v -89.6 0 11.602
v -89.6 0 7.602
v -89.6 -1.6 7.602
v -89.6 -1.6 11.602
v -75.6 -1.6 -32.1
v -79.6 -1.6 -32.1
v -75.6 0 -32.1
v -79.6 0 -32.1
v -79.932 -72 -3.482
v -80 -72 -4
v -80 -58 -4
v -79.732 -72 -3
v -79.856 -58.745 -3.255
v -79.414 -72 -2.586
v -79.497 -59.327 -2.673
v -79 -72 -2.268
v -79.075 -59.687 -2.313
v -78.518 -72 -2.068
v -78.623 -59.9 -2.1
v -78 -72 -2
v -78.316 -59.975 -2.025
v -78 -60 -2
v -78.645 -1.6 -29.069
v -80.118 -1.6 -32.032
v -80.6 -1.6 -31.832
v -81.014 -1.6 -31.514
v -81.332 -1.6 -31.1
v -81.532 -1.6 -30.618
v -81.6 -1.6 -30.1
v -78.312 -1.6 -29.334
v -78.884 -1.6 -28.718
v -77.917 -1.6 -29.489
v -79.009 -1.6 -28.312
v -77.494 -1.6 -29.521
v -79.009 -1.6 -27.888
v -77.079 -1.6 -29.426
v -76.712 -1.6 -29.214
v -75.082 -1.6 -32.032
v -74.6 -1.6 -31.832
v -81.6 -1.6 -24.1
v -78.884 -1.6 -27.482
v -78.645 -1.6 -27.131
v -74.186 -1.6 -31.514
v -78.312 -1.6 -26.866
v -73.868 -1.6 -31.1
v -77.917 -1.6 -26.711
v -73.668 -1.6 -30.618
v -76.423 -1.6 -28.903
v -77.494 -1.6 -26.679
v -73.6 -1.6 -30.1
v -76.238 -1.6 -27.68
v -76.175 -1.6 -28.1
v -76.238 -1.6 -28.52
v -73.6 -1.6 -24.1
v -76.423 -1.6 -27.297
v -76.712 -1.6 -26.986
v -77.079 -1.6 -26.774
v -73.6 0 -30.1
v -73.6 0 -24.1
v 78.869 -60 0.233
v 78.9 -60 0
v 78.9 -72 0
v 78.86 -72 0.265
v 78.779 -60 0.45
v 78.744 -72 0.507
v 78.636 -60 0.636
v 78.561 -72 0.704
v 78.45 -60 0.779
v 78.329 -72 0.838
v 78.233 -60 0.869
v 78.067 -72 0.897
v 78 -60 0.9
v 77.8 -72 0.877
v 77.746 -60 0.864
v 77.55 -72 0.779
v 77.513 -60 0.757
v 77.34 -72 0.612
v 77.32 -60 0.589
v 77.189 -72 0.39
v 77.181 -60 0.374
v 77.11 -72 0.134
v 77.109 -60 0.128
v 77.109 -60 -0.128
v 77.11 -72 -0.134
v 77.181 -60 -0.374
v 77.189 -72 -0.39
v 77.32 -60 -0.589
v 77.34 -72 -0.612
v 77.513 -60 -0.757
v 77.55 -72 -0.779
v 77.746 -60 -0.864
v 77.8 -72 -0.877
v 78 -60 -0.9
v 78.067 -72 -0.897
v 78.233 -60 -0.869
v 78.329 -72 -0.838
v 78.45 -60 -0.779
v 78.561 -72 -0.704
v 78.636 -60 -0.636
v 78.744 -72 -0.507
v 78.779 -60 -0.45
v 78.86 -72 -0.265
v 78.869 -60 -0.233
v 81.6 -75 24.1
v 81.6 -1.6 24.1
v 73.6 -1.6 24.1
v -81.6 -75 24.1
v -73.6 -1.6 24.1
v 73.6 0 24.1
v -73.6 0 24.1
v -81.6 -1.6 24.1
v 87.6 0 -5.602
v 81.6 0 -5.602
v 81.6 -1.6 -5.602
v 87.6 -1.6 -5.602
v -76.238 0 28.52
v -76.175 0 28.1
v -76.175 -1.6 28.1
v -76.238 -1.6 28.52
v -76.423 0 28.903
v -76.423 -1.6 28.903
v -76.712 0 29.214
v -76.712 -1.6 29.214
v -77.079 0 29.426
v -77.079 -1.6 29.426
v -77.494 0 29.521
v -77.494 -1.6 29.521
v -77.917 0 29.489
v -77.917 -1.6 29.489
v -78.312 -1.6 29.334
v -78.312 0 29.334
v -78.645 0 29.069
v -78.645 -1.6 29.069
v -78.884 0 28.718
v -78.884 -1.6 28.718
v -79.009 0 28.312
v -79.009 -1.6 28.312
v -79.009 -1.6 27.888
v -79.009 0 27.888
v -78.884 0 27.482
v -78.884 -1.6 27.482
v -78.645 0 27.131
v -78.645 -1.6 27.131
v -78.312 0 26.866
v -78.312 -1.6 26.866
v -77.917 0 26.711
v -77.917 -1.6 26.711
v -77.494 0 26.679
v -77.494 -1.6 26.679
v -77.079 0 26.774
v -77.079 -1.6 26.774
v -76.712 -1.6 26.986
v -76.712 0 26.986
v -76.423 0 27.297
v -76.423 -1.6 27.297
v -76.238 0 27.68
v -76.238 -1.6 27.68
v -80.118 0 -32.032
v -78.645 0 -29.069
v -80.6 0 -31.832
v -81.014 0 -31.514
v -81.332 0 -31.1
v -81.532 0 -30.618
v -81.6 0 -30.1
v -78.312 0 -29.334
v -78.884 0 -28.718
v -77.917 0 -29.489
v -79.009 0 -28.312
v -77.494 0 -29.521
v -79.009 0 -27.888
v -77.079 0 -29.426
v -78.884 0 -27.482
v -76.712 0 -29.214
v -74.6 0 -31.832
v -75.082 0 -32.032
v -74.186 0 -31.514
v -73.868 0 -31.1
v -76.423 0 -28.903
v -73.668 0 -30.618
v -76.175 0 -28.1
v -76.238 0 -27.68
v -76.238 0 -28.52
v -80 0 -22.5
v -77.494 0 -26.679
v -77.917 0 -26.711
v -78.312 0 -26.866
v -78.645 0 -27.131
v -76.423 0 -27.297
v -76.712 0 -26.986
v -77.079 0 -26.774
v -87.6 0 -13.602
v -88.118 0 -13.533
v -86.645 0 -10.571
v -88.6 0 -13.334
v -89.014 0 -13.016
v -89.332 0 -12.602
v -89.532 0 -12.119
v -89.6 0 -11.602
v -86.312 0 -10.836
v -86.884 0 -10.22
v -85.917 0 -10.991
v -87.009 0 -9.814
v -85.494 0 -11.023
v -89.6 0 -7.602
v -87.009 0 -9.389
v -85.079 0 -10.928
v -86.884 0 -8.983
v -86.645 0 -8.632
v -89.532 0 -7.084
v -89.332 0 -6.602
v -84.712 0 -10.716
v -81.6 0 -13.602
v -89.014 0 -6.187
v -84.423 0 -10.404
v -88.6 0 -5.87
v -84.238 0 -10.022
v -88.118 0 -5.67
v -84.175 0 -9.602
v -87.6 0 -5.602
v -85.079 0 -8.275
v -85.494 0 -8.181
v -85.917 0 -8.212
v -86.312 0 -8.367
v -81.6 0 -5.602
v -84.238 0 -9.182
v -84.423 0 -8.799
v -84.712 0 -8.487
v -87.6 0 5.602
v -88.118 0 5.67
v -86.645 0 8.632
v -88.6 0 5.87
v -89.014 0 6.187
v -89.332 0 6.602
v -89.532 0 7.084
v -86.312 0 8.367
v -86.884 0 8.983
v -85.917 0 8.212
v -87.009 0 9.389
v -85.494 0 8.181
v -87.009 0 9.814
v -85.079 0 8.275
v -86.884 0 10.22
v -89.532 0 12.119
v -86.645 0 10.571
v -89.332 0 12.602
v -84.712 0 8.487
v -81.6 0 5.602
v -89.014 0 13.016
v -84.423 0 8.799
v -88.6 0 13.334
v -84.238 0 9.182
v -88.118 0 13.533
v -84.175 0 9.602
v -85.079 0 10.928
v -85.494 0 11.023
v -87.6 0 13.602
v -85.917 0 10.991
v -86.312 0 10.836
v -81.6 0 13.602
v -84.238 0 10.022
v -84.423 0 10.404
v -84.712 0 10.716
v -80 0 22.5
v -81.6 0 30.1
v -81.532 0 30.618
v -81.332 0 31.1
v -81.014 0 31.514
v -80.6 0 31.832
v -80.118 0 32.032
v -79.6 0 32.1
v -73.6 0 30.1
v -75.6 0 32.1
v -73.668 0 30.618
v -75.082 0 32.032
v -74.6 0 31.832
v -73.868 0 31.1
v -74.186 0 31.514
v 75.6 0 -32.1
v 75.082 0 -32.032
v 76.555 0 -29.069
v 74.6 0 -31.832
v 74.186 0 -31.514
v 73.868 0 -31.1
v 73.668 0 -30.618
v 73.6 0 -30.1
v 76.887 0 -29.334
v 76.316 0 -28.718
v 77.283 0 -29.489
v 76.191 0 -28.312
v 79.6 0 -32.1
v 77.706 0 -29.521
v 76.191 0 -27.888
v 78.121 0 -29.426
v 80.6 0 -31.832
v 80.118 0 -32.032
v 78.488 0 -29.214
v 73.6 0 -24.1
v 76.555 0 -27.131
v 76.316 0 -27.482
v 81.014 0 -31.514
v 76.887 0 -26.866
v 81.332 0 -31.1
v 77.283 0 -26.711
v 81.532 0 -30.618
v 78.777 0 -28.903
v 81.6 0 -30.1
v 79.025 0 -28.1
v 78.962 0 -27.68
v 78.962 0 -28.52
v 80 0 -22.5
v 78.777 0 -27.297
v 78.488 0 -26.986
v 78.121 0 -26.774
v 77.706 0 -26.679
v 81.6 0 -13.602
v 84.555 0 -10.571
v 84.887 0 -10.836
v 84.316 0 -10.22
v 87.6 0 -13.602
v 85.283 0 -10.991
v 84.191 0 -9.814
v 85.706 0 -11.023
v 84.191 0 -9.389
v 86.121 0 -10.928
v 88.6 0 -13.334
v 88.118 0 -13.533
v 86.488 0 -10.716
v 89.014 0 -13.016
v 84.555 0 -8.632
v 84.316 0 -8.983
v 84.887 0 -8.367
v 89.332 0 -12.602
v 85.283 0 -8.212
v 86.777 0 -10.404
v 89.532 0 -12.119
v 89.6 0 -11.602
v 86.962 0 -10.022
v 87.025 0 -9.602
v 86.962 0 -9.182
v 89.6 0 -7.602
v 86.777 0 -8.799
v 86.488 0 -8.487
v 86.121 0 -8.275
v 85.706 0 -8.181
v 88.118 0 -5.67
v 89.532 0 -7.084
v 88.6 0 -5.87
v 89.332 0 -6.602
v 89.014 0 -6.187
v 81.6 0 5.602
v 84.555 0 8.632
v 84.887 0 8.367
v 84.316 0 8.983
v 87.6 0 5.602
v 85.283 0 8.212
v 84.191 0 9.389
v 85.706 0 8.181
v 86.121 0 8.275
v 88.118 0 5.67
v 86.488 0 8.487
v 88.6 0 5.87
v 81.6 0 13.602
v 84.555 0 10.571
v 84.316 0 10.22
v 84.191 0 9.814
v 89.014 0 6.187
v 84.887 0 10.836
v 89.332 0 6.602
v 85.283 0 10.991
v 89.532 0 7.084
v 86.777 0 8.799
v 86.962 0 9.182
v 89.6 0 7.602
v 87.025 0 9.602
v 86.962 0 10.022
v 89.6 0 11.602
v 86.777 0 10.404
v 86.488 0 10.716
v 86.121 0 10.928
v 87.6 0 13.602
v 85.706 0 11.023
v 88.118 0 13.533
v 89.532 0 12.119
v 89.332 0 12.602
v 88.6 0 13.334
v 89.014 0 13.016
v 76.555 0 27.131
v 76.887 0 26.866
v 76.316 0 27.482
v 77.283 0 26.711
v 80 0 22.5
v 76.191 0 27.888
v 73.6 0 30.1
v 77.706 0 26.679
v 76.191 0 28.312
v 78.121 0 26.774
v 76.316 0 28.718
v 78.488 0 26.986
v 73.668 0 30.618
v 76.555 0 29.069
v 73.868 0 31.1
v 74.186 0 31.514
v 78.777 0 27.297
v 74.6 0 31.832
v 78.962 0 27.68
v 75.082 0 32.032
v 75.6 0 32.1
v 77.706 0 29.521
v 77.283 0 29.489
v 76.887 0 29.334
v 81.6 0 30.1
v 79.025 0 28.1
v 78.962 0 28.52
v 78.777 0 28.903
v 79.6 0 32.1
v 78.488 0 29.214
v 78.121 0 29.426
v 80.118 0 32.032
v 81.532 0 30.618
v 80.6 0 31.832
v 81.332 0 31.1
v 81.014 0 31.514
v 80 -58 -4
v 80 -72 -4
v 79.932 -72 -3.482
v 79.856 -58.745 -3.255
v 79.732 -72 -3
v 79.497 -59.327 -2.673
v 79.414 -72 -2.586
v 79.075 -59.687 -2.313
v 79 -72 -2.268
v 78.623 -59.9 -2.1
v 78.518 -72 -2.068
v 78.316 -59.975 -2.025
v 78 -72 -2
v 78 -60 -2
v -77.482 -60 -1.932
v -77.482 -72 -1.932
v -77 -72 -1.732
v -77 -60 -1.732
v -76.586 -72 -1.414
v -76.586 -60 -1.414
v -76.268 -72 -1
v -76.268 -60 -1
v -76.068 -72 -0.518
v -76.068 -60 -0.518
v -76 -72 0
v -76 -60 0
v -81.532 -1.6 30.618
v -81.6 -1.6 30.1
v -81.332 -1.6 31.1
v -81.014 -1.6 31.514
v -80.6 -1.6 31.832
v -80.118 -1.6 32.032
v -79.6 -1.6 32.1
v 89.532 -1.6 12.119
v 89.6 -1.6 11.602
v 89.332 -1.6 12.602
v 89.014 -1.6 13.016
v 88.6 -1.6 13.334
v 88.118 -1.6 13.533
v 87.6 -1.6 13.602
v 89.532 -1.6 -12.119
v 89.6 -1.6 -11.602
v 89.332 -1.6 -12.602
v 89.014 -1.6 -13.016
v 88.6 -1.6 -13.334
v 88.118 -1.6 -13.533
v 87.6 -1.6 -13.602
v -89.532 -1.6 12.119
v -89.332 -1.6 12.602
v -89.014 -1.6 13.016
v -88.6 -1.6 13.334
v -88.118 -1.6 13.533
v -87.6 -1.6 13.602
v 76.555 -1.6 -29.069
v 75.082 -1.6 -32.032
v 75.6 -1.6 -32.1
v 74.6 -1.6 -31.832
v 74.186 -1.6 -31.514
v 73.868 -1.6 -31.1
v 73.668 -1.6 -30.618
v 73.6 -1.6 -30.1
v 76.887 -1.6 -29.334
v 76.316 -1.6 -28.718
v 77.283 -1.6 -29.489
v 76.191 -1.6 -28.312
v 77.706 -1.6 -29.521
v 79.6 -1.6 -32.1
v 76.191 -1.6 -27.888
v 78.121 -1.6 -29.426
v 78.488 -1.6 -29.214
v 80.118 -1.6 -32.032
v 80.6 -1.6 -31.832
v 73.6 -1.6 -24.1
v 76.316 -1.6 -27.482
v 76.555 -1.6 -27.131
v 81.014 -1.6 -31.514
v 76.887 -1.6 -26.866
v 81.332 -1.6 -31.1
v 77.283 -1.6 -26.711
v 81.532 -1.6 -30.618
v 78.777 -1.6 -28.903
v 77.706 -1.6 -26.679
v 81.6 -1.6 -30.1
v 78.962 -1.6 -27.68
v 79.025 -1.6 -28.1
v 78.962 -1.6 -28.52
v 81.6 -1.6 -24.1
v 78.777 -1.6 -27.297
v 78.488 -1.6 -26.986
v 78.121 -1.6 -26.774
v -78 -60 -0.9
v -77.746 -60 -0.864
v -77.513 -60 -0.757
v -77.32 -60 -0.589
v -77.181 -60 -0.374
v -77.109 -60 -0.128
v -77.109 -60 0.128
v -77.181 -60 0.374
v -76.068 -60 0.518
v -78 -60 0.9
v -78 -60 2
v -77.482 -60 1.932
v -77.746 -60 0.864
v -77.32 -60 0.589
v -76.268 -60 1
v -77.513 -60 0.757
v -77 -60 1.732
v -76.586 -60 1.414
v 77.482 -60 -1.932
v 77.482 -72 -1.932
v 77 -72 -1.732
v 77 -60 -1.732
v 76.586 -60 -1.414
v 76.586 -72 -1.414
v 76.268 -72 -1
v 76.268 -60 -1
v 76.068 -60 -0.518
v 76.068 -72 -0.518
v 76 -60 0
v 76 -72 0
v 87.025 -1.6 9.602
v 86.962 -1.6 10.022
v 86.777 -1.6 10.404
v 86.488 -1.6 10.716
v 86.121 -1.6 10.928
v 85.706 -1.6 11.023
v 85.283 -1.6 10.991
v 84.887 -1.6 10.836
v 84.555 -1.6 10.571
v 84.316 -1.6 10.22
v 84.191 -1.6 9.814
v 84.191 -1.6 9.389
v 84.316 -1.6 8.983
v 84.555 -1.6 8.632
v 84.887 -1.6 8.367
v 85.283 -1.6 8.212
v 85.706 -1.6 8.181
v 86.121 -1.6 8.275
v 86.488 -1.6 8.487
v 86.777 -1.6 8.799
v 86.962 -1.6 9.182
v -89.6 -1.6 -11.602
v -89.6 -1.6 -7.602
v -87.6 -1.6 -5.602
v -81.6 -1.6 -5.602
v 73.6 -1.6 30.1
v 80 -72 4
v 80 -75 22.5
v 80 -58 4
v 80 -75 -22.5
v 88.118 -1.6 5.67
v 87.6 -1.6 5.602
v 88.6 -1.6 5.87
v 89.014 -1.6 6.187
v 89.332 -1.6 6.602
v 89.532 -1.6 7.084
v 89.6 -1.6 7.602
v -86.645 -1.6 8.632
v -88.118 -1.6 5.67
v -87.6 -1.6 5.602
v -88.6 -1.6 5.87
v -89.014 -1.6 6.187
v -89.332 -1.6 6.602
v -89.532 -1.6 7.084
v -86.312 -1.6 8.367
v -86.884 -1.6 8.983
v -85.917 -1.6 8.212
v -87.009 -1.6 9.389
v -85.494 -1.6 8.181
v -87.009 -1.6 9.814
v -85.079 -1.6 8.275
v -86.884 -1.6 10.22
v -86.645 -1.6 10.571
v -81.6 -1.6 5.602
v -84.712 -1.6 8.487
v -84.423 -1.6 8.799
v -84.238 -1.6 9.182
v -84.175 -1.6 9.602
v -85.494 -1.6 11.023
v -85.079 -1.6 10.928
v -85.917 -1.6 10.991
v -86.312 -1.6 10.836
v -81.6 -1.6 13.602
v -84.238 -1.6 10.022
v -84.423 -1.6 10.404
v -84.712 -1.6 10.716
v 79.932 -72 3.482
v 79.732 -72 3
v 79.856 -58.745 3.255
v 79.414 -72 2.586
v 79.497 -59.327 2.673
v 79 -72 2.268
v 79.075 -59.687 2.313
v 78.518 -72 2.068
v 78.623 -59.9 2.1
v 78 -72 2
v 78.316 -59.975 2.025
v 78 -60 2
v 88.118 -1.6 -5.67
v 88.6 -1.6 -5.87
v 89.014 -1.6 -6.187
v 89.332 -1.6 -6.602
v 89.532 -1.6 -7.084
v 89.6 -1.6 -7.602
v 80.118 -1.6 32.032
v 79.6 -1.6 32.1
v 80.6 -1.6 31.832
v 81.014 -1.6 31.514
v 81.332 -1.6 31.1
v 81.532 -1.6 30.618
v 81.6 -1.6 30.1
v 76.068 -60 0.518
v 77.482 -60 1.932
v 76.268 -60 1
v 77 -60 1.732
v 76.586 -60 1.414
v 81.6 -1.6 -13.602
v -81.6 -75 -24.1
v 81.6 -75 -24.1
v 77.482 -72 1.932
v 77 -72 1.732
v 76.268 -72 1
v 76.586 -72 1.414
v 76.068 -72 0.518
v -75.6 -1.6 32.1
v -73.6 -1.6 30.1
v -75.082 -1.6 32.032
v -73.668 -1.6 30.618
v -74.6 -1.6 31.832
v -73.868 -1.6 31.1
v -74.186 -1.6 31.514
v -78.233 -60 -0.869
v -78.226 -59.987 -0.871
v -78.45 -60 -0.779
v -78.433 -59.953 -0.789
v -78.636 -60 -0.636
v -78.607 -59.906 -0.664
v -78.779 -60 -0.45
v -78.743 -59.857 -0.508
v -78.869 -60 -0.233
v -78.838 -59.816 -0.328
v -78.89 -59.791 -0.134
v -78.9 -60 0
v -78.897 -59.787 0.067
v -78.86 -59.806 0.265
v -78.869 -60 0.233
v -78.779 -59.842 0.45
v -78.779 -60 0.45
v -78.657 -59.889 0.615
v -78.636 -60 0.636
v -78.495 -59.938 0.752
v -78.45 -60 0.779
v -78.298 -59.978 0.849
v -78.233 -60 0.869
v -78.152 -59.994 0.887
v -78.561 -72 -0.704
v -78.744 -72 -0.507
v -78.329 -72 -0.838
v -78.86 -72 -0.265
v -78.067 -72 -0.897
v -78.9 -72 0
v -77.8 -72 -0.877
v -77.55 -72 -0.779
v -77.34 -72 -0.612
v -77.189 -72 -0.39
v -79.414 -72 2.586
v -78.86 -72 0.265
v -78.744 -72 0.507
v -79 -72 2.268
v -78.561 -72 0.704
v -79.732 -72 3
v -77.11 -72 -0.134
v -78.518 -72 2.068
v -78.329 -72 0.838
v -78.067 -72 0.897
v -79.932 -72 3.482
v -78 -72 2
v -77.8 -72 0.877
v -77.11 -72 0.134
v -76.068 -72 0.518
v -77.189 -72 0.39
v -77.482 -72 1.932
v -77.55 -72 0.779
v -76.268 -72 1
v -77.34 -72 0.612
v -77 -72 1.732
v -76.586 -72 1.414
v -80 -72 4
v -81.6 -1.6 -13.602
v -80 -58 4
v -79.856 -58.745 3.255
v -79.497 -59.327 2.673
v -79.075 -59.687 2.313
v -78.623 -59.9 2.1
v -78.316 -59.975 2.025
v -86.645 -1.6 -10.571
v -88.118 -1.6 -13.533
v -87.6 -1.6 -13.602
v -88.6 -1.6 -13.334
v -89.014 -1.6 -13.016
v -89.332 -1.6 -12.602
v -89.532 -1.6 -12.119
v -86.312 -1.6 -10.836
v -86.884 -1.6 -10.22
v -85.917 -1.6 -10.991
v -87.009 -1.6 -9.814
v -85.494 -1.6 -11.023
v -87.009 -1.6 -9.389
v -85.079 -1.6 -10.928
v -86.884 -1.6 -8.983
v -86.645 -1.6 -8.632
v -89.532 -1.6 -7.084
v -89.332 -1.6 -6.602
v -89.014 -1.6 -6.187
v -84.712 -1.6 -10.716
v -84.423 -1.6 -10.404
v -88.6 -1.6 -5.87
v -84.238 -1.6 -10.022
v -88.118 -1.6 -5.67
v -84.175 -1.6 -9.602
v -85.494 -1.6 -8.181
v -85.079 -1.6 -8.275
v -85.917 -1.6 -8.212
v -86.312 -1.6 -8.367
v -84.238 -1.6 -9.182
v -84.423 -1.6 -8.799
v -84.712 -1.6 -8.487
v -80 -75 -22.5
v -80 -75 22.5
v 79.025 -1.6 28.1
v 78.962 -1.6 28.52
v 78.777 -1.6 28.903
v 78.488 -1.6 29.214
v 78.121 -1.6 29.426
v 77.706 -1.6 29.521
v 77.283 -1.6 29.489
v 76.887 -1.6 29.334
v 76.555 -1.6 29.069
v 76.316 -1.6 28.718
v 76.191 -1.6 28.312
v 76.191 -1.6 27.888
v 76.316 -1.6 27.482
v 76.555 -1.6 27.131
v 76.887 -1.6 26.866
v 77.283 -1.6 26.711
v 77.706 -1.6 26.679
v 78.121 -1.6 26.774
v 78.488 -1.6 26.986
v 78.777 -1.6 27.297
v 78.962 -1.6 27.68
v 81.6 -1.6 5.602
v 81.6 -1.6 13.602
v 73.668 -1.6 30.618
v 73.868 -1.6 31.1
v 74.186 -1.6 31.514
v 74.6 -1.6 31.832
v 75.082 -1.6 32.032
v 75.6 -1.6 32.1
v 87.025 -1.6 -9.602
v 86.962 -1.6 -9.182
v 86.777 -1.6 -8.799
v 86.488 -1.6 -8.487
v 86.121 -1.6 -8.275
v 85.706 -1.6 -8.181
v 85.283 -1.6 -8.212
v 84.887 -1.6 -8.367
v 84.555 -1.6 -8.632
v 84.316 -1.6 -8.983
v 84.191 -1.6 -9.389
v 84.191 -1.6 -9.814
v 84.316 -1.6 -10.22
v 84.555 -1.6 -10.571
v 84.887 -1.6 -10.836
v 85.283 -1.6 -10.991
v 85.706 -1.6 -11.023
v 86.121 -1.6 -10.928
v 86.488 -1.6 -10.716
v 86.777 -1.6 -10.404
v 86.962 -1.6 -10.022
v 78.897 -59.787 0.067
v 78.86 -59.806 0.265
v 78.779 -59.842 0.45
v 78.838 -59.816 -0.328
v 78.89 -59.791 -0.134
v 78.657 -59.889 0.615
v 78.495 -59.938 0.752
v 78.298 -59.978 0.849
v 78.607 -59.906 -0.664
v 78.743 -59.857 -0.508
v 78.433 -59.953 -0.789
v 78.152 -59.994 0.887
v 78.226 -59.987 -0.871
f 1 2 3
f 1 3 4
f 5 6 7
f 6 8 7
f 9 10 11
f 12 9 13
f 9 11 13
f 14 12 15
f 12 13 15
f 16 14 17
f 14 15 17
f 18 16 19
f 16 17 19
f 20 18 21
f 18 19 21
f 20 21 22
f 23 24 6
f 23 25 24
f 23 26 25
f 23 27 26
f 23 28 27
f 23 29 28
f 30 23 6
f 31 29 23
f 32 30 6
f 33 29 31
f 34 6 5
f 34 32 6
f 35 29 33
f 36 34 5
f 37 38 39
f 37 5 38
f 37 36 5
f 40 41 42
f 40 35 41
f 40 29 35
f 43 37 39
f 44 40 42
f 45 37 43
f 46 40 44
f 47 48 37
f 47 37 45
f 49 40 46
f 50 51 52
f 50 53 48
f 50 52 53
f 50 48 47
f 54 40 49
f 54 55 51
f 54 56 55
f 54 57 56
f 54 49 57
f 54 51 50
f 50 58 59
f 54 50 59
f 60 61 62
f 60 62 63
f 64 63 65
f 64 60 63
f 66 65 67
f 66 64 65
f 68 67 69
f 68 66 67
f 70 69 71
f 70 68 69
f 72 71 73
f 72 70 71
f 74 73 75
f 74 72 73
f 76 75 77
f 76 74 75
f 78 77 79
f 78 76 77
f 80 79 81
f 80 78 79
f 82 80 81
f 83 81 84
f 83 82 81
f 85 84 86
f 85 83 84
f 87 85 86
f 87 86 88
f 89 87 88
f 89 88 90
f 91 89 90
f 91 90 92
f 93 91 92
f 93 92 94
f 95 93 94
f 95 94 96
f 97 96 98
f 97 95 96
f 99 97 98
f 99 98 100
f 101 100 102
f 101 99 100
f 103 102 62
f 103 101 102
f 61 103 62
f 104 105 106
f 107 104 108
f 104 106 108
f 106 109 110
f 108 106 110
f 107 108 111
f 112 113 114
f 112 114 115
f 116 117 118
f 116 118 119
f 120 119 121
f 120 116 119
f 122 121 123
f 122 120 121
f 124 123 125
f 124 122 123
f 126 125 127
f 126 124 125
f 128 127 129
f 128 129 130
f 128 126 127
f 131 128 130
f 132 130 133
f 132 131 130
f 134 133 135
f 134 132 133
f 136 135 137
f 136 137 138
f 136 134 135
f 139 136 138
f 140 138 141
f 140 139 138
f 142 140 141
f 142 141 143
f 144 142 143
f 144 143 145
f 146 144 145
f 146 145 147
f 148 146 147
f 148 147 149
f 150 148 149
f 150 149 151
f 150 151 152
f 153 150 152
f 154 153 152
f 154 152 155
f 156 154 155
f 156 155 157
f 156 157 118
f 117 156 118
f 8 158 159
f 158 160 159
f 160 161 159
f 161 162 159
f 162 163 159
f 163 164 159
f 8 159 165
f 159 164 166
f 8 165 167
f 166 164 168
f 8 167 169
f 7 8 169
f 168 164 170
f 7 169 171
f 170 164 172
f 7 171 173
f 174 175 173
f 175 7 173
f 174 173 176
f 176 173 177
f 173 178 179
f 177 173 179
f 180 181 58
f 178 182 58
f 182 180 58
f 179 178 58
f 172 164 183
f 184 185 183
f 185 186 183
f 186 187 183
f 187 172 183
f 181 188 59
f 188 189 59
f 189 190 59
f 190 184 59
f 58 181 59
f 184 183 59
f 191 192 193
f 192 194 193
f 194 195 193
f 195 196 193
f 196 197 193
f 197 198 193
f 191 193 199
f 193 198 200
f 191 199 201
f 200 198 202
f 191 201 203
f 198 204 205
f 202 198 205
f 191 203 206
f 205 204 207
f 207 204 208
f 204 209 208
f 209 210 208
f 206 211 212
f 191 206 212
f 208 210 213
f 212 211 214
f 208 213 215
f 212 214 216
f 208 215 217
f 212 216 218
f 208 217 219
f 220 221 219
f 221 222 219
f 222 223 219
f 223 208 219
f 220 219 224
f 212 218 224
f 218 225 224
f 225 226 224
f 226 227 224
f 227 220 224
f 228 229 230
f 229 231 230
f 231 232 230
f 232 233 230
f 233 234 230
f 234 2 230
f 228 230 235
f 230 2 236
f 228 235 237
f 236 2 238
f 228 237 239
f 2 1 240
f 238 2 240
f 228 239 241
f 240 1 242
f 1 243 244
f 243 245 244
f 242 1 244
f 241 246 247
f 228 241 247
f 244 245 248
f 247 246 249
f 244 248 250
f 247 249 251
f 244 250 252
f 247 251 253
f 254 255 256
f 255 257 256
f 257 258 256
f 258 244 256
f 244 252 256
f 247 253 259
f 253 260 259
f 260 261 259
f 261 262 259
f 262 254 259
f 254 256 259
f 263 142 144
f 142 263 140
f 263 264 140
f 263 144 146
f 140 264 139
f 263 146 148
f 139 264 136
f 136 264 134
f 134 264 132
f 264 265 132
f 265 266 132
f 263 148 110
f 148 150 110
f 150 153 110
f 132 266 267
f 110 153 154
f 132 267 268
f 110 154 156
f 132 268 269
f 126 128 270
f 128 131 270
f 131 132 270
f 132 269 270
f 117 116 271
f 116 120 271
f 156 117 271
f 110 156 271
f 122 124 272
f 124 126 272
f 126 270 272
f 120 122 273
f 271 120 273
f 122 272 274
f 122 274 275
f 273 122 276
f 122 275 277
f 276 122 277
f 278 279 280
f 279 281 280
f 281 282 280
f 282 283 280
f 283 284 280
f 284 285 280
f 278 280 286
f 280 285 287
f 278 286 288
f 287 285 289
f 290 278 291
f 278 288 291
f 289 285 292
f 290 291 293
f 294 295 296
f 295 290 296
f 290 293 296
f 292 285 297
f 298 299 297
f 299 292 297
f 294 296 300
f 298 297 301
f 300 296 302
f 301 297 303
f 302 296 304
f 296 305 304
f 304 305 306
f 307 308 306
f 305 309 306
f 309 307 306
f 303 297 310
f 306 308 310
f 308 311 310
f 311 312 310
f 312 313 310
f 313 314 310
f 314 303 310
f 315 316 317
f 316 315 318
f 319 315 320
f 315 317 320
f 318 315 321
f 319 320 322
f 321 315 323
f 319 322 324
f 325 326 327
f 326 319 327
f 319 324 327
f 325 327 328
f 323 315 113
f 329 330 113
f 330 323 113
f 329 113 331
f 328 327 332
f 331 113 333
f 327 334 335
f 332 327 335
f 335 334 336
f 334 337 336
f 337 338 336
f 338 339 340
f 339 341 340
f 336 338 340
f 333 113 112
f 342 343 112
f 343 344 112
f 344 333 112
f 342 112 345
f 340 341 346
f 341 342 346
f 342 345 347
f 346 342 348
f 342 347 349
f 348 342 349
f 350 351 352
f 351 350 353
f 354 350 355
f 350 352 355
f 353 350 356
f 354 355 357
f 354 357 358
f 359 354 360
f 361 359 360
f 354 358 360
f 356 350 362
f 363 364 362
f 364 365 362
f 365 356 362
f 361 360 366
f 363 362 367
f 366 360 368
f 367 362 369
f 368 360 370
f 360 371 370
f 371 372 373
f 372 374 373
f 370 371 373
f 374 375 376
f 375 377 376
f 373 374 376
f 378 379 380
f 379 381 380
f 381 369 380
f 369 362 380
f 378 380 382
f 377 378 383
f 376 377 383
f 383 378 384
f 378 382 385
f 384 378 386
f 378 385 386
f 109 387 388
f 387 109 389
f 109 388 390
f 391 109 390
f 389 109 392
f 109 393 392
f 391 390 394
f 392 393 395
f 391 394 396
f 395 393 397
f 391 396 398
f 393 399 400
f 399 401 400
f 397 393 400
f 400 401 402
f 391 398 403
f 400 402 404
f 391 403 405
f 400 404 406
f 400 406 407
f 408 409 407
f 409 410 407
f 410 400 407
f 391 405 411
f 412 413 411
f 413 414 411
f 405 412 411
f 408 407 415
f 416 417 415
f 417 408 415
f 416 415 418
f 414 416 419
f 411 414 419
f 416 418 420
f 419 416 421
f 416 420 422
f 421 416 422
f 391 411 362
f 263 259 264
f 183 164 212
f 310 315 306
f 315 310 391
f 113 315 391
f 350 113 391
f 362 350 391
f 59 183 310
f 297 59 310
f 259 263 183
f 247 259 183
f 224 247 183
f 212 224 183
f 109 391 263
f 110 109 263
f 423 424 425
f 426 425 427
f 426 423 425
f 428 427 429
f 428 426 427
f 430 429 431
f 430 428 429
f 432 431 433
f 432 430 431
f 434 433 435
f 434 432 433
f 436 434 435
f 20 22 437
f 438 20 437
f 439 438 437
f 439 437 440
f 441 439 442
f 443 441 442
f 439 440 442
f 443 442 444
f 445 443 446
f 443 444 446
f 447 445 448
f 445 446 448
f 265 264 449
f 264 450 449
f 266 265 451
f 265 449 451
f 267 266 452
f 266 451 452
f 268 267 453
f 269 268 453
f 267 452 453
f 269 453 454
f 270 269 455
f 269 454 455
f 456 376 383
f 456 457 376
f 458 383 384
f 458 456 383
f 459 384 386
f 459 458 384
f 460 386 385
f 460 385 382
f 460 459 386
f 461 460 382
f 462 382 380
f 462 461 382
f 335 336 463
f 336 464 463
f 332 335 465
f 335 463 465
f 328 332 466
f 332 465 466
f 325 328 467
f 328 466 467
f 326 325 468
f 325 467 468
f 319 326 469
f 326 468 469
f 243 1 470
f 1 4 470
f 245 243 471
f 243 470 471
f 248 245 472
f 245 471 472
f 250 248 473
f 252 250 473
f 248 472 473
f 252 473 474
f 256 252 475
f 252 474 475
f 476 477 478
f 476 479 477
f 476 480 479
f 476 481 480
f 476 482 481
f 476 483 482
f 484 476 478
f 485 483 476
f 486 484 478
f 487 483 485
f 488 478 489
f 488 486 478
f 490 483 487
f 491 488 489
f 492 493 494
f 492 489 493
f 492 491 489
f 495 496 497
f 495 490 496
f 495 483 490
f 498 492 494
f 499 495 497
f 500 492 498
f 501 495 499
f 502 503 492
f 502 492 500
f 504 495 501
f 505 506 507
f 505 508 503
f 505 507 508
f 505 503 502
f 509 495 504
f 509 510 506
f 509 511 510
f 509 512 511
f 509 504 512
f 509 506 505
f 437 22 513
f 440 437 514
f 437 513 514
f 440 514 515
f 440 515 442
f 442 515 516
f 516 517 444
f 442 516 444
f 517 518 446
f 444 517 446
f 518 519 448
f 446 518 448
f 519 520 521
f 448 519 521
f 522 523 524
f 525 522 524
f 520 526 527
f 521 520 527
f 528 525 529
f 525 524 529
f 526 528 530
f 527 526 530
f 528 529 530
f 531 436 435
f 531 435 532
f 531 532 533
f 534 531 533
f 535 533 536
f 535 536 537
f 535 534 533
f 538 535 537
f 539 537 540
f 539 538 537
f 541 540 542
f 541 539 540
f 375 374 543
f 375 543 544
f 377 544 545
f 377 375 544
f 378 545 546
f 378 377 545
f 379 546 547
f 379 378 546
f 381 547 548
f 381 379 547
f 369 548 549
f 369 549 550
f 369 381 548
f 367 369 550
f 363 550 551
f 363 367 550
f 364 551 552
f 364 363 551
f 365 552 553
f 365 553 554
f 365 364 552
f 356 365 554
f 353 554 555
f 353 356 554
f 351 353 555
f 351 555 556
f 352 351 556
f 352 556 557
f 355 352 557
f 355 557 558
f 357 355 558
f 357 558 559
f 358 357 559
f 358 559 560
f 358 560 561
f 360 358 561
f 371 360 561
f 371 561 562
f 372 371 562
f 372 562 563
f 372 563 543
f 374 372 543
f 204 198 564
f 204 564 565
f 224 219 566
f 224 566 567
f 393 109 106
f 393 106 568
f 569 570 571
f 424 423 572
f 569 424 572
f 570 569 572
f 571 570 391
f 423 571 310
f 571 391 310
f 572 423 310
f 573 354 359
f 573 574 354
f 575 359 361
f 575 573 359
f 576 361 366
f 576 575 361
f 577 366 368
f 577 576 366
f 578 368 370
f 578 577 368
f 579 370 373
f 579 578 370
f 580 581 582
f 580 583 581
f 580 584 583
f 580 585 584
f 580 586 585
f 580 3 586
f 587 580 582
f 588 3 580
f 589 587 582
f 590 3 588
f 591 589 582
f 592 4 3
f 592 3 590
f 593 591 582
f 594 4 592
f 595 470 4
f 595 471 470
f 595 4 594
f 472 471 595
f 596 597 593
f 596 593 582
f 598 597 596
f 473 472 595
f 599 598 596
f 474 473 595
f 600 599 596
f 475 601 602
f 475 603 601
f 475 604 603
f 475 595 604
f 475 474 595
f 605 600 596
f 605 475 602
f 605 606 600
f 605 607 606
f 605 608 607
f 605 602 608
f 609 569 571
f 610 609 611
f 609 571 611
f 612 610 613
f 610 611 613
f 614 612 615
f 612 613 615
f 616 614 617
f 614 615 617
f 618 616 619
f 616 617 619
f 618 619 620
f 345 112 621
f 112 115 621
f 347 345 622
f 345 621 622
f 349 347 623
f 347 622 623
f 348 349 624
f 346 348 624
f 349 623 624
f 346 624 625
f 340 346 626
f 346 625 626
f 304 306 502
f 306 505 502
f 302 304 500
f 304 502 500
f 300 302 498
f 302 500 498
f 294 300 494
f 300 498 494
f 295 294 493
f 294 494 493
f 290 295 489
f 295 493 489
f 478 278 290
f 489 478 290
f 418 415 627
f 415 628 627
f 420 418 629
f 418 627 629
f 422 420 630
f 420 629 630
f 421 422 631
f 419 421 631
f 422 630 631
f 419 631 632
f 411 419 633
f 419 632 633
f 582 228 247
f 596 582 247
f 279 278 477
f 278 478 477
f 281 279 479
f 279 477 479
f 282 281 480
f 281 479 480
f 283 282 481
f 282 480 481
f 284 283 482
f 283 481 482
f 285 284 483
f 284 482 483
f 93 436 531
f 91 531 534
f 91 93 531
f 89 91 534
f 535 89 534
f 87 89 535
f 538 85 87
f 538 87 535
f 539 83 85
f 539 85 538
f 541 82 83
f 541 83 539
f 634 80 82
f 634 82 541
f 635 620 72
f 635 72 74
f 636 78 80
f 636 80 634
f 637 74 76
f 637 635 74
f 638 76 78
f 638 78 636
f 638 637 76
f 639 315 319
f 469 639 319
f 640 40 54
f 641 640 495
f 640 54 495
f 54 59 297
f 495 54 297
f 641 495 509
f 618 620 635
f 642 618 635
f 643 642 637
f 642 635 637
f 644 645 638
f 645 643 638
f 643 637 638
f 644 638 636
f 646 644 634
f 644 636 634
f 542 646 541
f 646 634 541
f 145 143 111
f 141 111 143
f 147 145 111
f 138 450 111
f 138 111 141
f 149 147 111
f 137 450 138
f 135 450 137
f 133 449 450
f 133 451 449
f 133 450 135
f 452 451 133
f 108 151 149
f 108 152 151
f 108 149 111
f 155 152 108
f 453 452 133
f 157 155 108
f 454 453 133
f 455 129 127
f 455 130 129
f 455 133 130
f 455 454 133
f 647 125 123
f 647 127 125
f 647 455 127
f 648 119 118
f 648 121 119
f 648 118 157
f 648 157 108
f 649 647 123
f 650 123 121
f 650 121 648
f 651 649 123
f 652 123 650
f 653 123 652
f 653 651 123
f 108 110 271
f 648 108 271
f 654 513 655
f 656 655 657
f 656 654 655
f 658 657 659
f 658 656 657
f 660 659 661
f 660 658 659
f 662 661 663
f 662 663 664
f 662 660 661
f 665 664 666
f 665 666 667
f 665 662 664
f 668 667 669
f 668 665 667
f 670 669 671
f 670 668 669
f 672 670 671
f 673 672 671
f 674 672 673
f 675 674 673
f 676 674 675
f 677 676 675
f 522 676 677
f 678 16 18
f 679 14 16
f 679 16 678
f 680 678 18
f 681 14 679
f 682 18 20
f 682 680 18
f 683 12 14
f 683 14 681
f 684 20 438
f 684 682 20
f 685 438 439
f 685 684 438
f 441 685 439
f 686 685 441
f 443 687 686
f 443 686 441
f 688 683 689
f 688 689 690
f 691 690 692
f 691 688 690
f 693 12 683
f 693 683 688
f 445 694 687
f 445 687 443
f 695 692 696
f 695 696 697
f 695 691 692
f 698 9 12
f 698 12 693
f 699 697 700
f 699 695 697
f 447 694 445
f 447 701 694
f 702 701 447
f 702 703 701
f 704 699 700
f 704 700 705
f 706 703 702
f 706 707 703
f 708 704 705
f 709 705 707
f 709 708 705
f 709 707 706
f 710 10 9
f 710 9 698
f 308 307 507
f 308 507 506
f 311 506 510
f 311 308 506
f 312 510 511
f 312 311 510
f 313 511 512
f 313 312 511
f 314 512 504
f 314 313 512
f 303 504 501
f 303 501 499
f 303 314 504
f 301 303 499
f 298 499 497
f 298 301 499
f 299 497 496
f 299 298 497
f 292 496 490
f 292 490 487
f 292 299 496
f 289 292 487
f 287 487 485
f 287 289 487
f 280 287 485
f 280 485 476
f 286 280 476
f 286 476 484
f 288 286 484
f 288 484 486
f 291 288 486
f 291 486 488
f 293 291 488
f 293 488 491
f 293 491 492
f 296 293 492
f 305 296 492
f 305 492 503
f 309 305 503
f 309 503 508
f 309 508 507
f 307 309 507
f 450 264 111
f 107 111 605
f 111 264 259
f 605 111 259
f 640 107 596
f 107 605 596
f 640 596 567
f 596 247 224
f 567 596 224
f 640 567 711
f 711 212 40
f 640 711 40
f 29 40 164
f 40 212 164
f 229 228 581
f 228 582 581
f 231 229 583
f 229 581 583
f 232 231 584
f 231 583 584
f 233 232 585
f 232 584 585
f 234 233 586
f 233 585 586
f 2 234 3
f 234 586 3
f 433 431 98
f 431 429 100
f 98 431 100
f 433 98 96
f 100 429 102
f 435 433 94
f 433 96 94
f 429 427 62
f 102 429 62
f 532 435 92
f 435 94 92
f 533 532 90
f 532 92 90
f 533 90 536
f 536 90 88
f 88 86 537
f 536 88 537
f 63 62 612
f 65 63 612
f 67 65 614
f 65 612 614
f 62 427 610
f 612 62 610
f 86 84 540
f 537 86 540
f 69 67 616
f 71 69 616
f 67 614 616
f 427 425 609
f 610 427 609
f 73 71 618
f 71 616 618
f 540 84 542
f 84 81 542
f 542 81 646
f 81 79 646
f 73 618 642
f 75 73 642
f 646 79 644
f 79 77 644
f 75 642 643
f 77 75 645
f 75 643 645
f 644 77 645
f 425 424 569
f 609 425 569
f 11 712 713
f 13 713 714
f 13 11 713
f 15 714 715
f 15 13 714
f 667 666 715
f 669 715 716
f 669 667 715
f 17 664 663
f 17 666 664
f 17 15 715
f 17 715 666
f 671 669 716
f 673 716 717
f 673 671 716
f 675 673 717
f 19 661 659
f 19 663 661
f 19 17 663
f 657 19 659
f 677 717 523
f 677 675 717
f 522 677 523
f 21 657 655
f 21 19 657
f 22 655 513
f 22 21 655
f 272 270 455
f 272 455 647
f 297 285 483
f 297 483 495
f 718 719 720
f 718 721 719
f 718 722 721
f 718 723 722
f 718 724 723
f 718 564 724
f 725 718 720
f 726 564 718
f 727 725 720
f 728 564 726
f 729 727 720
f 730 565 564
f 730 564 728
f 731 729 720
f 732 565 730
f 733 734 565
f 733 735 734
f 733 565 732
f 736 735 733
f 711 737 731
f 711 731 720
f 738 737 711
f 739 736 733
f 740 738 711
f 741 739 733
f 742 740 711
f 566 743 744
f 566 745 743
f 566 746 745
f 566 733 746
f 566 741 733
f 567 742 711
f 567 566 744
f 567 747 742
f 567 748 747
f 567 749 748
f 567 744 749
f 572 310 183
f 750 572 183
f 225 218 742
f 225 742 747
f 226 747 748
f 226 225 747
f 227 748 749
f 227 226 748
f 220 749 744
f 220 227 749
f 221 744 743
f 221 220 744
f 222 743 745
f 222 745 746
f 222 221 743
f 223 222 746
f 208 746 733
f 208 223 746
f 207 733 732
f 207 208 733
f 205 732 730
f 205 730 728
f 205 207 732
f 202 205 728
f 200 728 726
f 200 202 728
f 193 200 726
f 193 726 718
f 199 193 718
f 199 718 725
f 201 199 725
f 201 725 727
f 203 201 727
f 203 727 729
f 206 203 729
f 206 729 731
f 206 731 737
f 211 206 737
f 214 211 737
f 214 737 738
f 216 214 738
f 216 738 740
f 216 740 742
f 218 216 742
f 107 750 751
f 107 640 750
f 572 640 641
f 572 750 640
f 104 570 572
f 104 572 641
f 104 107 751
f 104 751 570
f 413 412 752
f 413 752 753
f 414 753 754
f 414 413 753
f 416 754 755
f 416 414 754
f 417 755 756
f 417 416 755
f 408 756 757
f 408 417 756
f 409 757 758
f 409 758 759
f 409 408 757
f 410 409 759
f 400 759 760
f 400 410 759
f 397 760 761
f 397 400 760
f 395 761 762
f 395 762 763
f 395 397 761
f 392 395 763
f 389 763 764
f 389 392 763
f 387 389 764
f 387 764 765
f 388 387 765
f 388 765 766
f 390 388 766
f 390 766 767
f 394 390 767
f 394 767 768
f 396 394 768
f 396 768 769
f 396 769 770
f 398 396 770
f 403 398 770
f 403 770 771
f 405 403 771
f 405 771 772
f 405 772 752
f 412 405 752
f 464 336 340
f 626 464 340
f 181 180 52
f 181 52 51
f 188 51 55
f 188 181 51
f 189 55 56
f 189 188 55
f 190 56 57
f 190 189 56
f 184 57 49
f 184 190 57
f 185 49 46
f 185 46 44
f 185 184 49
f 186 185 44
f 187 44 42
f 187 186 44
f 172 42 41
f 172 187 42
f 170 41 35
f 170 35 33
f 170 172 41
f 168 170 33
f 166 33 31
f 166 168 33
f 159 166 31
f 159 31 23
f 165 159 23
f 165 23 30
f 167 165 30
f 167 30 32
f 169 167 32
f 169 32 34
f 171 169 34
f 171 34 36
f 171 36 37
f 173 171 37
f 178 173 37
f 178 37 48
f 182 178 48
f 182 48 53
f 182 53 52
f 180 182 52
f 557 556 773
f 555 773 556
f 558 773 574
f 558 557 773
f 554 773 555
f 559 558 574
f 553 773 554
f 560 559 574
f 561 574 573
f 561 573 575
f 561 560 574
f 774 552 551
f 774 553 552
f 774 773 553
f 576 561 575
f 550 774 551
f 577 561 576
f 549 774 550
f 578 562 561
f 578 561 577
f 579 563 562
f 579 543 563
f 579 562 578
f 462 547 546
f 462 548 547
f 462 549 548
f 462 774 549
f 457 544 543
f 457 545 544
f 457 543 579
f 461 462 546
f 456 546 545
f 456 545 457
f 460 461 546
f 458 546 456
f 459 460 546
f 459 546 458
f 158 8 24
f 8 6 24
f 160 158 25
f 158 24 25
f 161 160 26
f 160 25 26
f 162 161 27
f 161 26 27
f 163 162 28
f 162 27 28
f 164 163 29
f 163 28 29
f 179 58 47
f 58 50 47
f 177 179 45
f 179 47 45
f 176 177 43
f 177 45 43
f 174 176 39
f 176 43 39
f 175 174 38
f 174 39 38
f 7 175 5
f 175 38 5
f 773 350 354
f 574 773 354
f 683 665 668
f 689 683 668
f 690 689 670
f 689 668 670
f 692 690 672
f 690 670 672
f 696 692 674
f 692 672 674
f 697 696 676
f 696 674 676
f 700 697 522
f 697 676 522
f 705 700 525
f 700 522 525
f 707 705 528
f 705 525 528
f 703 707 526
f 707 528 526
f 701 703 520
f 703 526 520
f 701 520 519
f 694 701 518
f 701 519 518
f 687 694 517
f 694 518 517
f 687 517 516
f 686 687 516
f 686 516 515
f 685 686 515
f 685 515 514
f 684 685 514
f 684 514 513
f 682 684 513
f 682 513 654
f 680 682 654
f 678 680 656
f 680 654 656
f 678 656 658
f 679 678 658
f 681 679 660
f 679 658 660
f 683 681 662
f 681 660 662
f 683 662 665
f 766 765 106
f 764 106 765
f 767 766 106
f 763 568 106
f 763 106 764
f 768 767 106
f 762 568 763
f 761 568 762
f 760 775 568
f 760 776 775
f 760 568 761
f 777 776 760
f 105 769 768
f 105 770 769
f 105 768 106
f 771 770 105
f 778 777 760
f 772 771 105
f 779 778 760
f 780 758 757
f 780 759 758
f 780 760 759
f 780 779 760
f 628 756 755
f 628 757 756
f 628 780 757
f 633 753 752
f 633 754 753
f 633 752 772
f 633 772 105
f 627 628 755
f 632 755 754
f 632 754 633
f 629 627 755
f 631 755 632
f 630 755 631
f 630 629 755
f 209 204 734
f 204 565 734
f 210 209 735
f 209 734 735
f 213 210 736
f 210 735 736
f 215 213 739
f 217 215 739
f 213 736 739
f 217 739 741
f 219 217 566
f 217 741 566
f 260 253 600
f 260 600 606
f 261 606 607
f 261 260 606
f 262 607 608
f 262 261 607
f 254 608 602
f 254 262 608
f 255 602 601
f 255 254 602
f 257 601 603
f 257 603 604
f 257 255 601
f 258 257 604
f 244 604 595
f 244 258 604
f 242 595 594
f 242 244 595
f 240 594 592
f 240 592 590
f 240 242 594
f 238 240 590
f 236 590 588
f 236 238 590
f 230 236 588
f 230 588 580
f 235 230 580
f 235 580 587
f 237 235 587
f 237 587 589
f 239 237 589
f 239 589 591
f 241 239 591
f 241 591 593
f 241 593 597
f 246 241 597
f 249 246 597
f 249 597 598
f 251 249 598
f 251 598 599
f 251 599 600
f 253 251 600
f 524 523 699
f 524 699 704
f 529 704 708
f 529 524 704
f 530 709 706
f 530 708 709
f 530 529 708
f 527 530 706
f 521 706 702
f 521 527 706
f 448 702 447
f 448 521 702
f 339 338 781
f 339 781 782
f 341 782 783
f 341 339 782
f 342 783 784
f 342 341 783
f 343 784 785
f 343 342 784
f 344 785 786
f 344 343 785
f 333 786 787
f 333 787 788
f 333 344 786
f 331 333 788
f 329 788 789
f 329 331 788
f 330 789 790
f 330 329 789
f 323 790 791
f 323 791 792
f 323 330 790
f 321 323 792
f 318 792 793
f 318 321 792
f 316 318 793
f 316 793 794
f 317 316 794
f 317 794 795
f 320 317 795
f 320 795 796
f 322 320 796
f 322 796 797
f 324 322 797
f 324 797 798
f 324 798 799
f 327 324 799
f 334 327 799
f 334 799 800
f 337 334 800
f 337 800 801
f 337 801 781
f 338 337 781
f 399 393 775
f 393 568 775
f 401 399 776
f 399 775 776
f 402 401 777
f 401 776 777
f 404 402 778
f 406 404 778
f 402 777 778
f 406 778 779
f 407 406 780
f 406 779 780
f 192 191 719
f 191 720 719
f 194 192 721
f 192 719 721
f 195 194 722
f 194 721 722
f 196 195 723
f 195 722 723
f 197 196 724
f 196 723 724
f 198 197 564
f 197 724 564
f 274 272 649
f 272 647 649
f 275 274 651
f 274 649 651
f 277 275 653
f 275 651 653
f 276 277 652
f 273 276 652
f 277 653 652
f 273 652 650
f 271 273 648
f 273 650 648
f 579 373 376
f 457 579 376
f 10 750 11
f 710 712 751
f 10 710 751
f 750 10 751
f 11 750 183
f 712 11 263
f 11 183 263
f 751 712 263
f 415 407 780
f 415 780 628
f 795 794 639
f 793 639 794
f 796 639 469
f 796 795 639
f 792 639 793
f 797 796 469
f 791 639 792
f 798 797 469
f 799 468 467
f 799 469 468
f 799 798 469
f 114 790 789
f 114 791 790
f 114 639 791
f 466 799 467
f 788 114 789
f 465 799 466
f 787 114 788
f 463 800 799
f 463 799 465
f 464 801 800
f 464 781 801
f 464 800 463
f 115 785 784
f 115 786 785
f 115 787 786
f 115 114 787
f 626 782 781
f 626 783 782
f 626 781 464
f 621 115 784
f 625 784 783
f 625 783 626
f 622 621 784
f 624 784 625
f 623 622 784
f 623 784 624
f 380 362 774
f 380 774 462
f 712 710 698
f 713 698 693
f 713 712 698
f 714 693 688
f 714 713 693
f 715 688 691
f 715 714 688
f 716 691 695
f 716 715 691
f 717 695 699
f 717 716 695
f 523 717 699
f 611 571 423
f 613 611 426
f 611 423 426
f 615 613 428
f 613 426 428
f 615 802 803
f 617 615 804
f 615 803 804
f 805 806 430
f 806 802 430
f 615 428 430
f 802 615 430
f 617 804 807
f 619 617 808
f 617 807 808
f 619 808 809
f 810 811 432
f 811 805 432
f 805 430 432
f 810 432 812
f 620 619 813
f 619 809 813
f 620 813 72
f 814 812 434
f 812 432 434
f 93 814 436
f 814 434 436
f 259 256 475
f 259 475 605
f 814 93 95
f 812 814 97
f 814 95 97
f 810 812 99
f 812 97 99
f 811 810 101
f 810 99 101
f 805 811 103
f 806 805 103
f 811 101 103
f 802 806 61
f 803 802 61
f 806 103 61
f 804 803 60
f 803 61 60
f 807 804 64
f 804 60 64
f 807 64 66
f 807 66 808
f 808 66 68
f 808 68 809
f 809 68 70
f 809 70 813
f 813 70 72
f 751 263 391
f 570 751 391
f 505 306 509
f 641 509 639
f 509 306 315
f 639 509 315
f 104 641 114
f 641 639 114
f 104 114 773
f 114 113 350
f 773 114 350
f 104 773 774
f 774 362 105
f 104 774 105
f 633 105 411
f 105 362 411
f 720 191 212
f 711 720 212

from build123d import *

# Parameters (mm, degrees)
F1_DEPTH     = 75
F0_W         = 8
F0_H         = 8
F0_R         = 1.425
F2_DEPTH     = 1.6
F3_R         = 2
F5_R         = 2
F6_START     = 60
F0_W_2       = 4
F0_H_2       = 4
F0_R_2       = 0.9
F6_DEPTH     = 12
F7_T1_DEPTH  = 12
F7_T6_DEPTH  = 4
F7_S7_R      = 0.9
F7_T8_DEPTH  = 4
F7_T13_DEPTH = 9
F7_T17_DEPTH = 17
F7_T24_DEPTH = 9
F7_T28_DEPTH = 17
F7_T31_DEPTH = 22
F9_R         = 2


# Not quite as in the source:
# - a fillet or chamfer that OpenCascade refuses, or shapes differently, is made with other operations: its cross-section is extruded or revolved along the edge and cut away or added


with BuildPart() as f1:
    # F0 (on Front) → F1 (new body)
    with BuildSketch(Plane.XZ):
        Polygon((-81.6, -13.6015841149), (-81.6, -24.1), (-73.6, -24.1), (73.6, -24.1), (81.6, -24.1), (81.6, -13.6015841149), (81.6, -5.6015841149), (81.6, 5.6015841149), (81.6, 13.6015841149), (81.6, 24.1), (73.6, 24.1), (-73.6, 24.1), (-81.6, 24.1), (-81.6, 13.6015841149), (-81.6, 5.6015841149), (-81.6, -5.6015841149), align=None)
        Polygon((80, -2), (80, -22.5), (-80, -22.5), (-80, 22.5), (80, 22.5), (80, 2), align=None, mode=Mode.SUBTRACT)
    extrude(amount=F1_DEPTH)

    # F0 (on Front) → F2 (join)
    with BuildSketch(Plane.XZ):
        Polygon((-81.6, -13.6015841149), (-81.6, -24.1), (-73.6, -24.1), (73.6, -24.1), (81.6, -24.1), (81.6, -13.6015841149), (81.6, -5.6015841149), (81.6, 5.6015841149), (81.6, 13.6015841149), (81.6, 24.1), (73.6, 24.1), (-73.6, 24.1), (-81.6, 24.1), (-81.6, 13.6015841149), (-81.6, 5.6015841149), (-81.6, -5.6015841149), align=None)
        Polygon((80, -2), (80, -22.5), (-80, -22.5), (-80, 22.5), (80, 22.5), (80, 2), align=None, mode=Mode.SUBTRACT)
        with Locations((-77.6, -28.1)):
            Rectangle(F0_W, F0_H)
        with Locations((-77.6, -28.1)):
            Circle(F0_R, mode=Mode.SUBTRACT)
        with Locations((-85.6, -9.6015841149)):
            Rectangle(F0_W, F0_H)
        with Locations((-85.6, -9.6015841149)):
            Circle(F0_R, mode=Mode.SUBTRACT)
        with Locations((77.6, -28.1)):
            Rectangle(F0_W, F0_H)
        with Locations((77.6, -28.1)):
            Circle(F0_R, mode=Mode.SUBTRACT)
        with Locations((-85.6, 9.6015841149)):
            Rectangle(F0_W, F0_H)
        with Locations((-85.6, 9.6015841149)):
            Circle(F0_R, mode=Mode.SUBTRACT)
        with Locations((85.6, -9.6015841149)):
            Rectangle(F0_W, F0_H)
        with Locations((85.6, -9.6015841149)):
            Circle(F0_R, mode=Mode.SUBTRACT)
        with Locations((-77.6, 28.1)):
            Rectangle(F0_W, F0_H)
        with Locations((-77.6, 28.1)):
            Circle(F0_R, mode=Mode.SUBTRACT)
        with Locations((85.6, 9.6015841149)):
            Rectangle(F0_W, F0_H)
        with Locations((85.6, 9.6015841149)):
            Circle(F0_R, mode=Mode.SUBTRACT)
        with Locations((77.6, 28.1)):
            Rectangle(F0_W, F0_H)
        with Locations((77.6, 28.1)):
            Circle(F0_R, mode=Mode.SUBTRACT)
    extrude(amount=F2_DEPTH)

    # F3
    f3_edges = [f1.edges().sort_by_distance(p)[0] for p in [
        (-81.6, -0.8, 32.1),
        (-73.6, -0.8, 32.1),
        (73.6, -0.8, 32.1),
        (81.6, -0.8, 32.1),
        (89.6, -0.8, -5.601584),
        (89.6, -0.8, -13.601584),
        (81.6, -0.8, -32.1),
        (73.6, -0.8, -32.1),
        (-89.6, -0.8, -13.601584),
        (-89.6, -0.8, -5.601584),
        (-81.6, -0.8, -32.1),
    ]]
    fillet(f3_edges, radius=F3_R)

    # F4: F1 across plane


with BuildPart() as f1_1:
    add(f1.part)
    add(f1.part.mirror(Plane.YZ))

    # F5
    f5_edges = [f1_1.edges().sort_by_distance(p)[0] for p in [
        (-73.6, -0.8, -32.1),
        (73.6, -0.8, -32.1),
    ]]
    fillet(f5_edges, radius=F5_R)

    # F0 (on Front) → F6 (join)
    with BuildSketch(Plane.XZ.offset(F6_START)):
        with Locations((78, 0)):
            Rectangle(F0_W_2, F0_H_2)
        with Locations((78, 0)):
            Circle(F0_R_2, mode=Mode.SUBTRACT)
    extrude(amount=F6_DEPTH)

    # F7: fillet of radius 2 on 5 edges, made by hand

    # F7_s2 → F7_t1 (join)
    with BuildSketch(Plane.XZ.offset(60)):
        with BuildLine():
            ThreePointArc((80, -4), (79.4142135624, -2.5857864376), (78, -2))
            Line((78, -2), (80, -2))
            Line((80, -2), (80, -4))
        make_face()
        with BuildLine():
            ThreePointArc((80, 4), (79.4142135624, 2.5857864376), (78, 2))
            Line((78, 2), (80, 2))
            Line((80, 2), (80, 4))
        make_face()
    extrude(amount=F7_T1_DEPTH)


with BuildPart() as f7_tool4:
    # F7_s5 → F7_t6 (new body)
    with BuildSketch(Plane.XY.offset(-2)):
        with BuildLine():
            ThreePointArc((80, -58), (79.4142135624, -59.4142135624), (78, -60))
            Line((78, -60), (80, -60))
            Line((80, -60), (80, -58))
        make_face()
    extrude(amount=F7_T6_DEPTH)

    # F7_s7 → F7_t8 (cut, symmetric)
    with BuildSketch(Plane.XZ.offset(59)):
        with Locations((78, 0)):
            Circle(F7_S7_R)
    extrude(amount=F7_T8_DEPTH, both=True, mode=Mode.SUBTRACT)


with BuildPart() as f1_2:
    add(f1_1.part)

    # F7_t3: union F7_tool4
    add(f7_tool4.part)


with BuildPart() as f7_tool11:
    # F7_s12 → F7_t13 (new body)
    with BuildSketch(Plane.XY.offset(-7)):
        with BuildLine():
            ThreePointArc((80, -58), (79.4142135624, -59.4142135624), (78, -60))
            Line((78, -60), (80, -60))
            Line((80, -60), (80, -58))
        make_face()
    extrude(amount=F7_T13_DEPTH)

    split(bisect_by=Plane.XY.offset(-2), keep=Keep.BOTTOM)


with BuildPart() as f7_tool15:
    # F7_s16 → F7_t17 (new body)
    with BuildSketch(Plane.XZ.offset(55)):
        with BuildLine():
            ThreePointArc((80, -4), (79.4142135624, -2.5857864376), (78, -2))
            Line((78, -2), (80, -2))
            Line((80, -2), (80, -4))
        make_face()
    extrude(amount=F7_T17_DEPTH)

    split(bisect_by=Plane.XZ.offset(60), keep=Keep.BOTTOM)


with BuildPart() as f7_tool11_1:
    add(f7_tool11.part)

    # F7_t19: intersect F7_tool15
    add(f7_tool15.part, mode=Mode.INTERSECT)


with BuildPart() as f1_3:
    add(f1_2.part)

    # F7_t9: union F7_tool11
    add(f7_tool11_1.part)


with BuildPart() as f7_tool22:
    # F7_s23 → F7_t24 (new body)
    with BuildSketch(Plane.XY.offset(-2)):
        with BuildLine():
            ThreePointArc((80, -58), (79.4142135624, -59.4142135624), (78, -60))
            Line((78, -60), (80, -60))
            Line((80, -60), (80, -58))
        make_face()
    extrude(amount=F7_T24_DEPTH)

    split(bisect_by=Plane.XY.offset(2), keep=Keep.TOP)


with BuildPart() as f7_tool26:
    # F7_s27 → F7_t28 (new body)
    with BuildSketch(Plane.XZ.offset(55)):
        with BuildLine():
            ThreePointArc((80, 4), (79.4142135624, 2.5857864376), (78, 2))
            Line((78, 2), (80, 2))
            Line((80, 2), (80, 4))
        make_face()
    extrude(amount=F7_T28_DEPTH)

    split(bisect_by=Plane.XZ.offset(60), keep=Keep.BOTTOM)


with BuildPart() as f7_tool22_1:
    add(f7_tool22.part)

    # F7_t30: intersect F7_tool26
    add(f7_tool26.part, mode=Mode.INTERSECT)


with BuildPart() as f1_4:
    add(f1_3.part)

    # F7_t20: union F7_tool22
    add(f7_tool22_1.part)

    # F7_s32 → F7_t31 (cut)
    with BuildSketch(Plane.XZ.offset(55)):
        with BuildLine():
            ThreePointArc((78, -2), (76.5857864376, -1.4142135624), (76, 0))
            Line((76, 0), (76, -2))
            Line((76, -2), (78, -2))
        make_face()
        with BuildLine():
            ThreePointArc((78, 2), (76.5857864376, 1.4142135624), (76, 0))
            Line((76, 0), (76, 2))
            Line((76, 2), (78, 2))
        make_face()
    extrude(amount=F7_T31_DEPTH, mode=Mode.SUBTRACT)

    # F8: F1 across plane


with BuildPart() as f1_5:
    add(f1_4.part)
    add(f1_4.part.mirror(Plane.YZ))

    # F9
    f9_edges = [f1_5.edges().sort_by_distance(p)[0] for p in [
        (89.6, -0.8, 5.601584),
        (89.6, -0.8, 13.601584),
        (-89.6, -0.8, 5.601584),
        (-89.6, -0.8, 13.601584),
    ]]
    fillet(f9_edges, radius=F9_R)


solid = f1_5.part
